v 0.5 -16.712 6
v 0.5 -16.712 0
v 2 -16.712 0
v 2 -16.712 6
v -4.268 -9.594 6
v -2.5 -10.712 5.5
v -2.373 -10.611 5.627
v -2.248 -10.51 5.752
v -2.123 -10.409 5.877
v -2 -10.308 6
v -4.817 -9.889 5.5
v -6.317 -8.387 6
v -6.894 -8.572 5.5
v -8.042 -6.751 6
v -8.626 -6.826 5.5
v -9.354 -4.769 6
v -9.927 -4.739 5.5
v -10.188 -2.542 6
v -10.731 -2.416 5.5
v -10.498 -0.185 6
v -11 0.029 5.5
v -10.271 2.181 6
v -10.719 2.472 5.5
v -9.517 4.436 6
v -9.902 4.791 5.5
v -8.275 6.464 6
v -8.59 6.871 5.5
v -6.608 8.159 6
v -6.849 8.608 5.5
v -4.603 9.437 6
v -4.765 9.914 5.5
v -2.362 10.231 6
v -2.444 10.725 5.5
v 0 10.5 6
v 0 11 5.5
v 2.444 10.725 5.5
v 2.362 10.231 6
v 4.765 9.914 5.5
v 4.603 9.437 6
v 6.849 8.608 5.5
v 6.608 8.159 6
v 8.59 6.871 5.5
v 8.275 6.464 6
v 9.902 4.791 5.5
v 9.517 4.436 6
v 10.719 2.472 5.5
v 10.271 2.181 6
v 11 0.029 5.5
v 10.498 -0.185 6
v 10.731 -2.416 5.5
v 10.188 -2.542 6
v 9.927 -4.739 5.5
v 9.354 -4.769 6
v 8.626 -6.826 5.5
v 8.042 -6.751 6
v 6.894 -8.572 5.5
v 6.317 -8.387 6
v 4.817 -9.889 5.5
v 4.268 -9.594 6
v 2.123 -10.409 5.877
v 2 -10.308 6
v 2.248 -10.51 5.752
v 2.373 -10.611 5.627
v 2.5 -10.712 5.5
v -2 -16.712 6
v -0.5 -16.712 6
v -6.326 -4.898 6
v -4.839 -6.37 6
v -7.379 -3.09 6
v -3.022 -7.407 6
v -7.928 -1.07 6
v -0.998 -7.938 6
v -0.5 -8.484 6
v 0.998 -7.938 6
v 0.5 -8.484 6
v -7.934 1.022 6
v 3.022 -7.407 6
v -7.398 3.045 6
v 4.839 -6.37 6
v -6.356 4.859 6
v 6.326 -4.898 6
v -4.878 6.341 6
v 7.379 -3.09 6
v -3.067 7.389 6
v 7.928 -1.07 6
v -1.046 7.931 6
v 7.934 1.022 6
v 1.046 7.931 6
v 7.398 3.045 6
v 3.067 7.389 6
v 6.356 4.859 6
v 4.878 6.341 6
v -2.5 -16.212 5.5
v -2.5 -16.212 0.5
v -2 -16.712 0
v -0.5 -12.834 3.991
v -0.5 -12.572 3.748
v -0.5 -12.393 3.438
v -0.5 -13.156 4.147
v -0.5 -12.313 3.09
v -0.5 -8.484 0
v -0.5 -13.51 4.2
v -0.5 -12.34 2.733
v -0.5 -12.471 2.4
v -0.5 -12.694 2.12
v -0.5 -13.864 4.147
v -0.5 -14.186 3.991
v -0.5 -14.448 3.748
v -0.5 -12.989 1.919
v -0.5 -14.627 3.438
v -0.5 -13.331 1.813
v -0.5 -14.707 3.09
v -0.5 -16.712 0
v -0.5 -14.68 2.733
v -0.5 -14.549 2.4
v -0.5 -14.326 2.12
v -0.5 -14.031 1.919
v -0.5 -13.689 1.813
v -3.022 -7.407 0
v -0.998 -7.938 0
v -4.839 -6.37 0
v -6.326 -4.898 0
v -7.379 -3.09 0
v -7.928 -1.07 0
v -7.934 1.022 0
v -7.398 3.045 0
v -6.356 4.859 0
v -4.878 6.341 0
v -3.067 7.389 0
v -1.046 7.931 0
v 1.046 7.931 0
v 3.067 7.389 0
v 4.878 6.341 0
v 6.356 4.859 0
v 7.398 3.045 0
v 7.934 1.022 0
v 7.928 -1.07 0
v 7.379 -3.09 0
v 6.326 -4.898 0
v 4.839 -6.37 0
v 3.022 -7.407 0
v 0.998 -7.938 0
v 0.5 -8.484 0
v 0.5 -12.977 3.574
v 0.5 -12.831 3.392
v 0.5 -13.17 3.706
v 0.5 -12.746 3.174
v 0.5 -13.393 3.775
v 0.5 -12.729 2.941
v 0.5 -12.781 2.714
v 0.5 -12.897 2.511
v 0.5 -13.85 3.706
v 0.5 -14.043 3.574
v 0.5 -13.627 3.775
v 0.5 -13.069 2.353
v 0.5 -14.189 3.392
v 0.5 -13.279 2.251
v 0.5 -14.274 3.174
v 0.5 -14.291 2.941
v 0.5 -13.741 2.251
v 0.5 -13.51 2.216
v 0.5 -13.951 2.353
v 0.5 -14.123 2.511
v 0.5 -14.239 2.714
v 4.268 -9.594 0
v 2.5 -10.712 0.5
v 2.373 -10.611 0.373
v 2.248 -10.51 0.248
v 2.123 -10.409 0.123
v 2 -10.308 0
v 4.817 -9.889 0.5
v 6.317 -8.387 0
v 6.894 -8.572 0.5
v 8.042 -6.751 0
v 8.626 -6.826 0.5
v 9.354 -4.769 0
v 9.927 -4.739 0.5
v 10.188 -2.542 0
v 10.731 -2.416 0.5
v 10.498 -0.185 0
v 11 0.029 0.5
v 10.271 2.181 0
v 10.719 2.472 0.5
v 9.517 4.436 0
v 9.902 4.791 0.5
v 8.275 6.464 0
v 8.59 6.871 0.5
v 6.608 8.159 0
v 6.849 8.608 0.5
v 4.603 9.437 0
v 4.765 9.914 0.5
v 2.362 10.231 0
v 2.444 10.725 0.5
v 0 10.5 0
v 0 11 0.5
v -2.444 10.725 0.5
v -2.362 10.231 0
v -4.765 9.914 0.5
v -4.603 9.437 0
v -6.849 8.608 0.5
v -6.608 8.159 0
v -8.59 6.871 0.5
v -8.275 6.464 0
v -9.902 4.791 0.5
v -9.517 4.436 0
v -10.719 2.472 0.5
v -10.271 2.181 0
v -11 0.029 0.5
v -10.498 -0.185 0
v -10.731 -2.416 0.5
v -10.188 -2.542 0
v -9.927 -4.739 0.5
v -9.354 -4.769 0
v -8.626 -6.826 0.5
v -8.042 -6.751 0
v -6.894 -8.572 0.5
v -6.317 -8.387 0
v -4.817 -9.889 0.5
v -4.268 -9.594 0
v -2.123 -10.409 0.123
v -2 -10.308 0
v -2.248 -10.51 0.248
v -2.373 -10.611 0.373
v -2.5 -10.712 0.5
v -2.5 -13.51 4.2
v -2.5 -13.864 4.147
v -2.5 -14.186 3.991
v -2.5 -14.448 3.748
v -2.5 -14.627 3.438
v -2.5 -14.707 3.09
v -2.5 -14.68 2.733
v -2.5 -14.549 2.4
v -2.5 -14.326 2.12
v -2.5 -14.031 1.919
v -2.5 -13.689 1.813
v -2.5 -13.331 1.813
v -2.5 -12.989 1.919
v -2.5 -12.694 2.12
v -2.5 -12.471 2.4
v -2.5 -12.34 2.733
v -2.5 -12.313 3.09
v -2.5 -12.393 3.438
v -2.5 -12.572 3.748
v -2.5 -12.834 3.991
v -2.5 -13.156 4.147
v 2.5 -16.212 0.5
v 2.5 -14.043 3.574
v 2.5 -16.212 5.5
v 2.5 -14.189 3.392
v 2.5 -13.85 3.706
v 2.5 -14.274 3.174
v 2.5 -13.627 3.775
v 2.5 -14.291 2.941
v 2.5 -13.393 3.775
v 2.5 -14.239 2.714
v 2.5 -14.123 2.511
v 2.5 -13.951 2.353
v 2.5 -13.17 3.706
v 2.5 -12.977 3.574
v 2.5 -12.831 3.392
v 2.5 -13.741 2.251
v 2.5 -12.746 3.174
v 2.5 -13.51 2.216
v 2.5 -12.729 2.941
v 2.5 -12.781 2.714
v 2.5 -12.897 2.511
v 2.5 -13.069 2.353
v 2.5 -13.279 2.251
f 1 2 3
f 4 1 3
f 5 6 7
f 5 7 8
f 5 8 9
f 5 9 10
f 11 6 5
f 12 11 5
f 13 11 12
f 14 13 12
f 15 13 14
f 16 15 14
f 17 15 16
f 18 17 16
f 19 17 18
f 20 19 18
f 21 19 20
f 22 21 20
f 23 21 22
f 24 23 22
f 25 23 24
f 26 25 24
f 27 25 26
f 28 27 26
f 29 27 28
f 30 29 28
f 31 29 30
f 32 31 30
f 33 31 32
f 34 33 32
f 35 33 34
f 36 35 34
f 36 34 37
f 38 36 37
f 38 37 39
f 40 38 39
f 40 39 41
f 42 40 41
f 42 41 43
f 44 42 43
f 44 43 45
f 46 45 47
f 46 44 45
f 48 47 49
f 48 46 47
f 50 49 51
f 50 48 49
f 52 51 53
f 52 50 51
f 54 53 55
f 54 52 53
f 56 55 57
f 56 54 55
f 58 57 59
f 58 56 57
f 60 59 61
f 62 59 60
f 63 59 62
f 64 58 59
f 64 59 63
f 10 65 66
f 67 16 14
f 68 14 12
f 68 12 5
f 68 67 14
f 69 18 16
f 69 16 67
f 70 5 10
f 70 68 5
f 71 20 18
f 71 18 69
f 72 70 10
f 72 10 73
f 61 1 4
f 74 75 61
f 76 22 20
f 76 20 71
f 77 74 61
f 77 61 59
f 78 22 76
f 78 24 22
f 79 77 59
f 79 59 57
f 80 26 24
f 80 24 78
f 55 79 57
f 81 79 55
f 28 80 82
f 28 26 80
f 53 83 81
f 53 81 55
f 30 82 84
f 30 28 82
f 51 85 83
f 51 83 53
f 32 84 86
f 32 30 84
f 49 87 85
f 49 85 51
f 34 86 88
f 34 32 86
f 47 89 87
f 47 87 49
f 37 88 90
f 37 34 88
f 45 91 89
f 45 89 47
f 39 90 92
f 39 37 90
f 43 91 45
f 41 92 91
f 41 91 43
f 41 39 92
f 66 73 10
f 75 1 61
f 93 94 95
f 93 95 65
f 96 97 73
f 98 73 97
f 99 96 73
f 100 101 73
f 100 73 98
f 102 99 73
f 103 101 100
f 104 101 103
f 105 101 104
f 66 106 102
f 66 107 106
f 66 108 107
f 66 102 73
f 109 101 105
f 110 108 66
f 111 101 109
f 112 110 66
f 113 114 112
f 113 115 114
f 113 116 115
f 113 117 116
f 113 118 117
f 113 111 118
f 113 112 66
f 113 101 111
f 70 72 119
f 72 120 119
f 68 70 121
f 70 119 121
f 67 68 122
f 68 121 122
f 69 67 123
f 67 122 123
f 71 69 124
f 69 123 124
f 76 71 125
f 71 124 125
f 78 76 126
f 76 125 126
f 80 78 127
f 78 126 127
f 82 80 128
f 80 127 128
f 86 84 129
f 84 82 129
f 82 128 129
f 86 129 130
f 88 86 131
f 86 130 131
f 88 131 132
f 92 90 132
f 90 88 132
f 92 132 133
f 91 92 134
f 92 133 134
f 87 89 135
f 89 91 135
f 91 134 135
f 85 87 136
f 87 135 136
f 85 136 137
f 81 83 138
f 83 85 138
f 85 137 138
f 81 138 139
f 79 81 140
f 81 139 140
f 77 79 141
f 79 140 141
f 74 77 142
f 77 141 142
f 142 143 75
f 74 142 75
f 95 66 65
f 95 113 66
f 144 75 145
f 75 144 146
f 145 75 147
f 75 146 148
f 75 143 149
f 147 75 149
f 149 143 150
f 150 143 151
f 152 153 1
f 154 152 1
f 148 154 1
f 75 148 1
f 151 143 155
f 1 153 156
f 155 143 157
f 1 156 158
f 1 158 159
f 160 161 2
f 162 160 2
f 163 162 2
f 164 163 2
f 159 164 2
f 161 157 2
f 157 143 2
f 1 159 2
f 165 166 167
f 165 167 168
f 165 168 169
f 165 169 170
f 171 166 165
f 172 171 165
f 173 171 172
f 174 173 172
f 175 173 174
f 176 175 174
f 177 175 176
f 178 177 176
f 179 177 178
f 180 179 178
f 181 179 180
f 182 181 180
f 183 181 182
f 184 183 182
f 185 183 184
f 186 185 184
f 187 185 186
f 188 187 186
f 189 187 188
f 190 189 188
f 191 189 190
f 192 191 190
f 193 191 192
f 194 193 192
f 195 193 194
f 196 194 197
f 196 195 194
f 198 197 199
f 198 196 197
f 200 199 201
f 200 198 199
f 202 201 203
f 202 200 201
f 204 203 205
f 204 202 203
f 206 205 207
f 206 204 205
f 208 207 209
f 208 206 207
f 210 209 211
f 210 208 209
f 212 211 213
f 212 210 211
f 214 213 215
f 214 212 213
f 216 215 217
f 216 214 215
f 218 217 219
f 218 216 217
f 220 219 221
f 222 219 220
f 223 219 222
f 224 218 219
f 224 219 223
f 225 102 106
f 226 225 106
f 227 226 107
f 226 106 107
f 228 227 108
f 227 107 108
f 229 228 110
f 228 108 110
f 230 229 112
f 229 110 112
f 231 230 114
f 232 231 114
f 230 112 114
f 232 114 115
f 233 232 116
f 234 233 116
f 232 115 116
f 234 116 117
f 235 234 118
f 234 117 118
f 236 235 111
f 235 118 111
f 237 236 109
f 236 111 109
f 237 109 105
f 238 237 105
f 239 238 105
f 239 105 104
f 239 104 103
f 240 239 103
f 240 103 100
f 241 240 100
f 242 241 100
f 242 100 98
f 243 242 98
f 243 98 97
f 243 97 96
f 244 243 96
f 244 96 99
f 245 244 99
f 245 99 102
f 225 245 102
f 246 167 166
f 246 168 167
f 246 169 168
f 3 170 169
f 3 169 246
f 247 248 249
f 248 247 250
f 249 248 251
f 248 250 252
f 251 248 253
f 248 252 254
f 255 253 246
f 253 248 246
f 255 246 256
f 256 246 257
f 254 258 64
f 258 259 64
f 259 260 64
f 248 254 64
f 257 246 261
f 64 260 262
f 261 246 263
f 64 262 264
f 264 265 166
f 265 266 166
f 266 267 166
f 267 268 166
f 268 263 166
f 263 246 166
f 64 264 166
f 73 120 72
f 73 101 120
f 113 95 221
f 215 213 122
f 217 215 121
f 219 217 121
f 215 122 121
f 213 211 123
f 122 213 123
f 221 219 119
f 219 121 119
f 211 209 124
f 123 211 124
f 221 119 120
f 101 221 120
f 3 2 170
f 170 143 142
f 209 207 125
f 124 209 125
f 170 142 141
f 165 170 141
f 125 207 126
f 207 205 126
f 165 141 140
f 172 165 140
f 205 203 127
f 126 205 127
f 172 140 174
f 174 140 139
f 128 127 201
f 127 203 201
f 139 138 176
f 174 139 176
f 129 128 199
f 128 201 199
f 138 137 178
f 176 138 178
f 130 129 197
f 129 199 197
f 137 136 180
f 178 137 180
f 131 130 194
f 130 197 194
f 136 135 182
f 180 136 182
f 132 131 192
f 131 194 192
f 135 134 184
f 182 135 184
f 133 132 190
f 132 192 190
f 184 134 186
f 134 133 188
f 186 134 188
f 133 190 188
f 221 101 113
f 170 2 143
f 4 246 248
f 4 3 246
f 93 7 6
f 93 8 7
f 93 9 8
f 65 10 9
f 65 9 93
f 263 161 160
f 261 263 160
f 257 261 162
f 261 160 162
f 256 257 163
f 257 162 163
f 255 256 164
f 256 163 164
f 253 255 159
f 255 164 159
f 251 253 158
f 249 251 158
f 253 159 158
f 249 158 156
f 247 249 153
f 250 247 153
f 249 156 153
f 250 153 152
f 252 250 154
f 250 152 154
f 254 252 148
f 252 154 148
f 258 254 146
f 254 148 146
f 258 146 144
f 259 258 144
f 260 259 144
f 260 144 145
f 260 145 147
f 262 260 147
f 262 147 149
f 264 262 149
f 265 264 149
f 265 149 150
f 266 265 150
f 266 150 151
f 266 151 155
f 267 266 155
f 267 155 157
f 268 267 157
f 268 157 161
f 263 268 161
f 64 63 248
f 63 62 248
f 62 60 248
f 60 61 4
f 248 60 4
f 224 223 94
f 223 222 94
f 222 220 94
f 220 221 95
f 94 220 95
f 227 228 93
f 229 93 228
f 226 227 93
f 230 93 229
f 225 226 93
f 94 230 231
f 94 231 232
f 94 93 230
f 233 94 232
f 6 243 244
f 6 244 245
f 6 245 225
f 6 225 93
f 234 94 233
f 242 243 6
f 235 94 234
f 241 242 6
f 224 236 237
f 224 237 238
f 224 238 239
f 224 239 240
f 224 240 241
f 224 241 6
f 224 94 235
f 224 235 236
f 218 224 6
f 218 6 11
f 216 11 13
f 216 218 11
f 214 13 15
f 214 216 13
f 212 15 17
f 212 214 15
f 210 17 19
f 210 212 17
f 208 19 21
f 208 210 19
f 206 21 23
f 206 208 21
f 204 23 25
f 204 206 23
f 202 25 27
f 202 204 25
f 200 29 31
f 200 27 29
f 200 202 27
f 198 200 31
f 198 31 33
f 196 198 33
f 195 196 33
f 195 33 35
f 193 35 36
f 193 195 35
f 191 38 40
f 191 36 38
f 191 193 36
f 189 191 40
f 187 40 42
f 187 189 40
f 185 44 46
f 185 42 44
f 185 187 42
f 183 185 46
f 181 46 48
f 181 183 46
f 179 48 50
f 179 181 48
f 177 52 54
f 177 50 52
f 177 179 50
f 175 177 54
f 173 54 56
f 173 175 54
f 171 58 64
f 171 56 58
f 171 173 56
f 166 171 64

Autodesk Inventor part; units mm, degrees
ref_plane "YZ Plane" through (0, 0, 0) normal (1, 0, 0) x (0, 1, 0)
ref_plane "XZ Plane" through (0, 0, 0) normal (0, 1, 0) x (-1, 0, 0)
ref_plane "XY Plane" through (0, 0, 0) normal (0, 0, 1) x (1, 0, 0)
sketch "Esquisse1" plane through (0, 0, 0) normal (0, 0, 1) x (1, 0, 0)
  arc A0 (0.5, -7.9844) -> (-0.5, -7.9844) centre (0, 0) ccw
  arc A1 (2.5, -10.7121) -> (-2.5, -10.7121) centre (0, 0) ccw
  line L0 (-0.5, -7.9844) -> (-0.5, -16.7121)
  line L1 (0.5, -7.9844) -> (0.5, -16.7121)
  line L2 (-0.5, -7.9844) -> (0.5, -7.9844) construction
  line L3 (-0.5, -16.7121) -> (-2.5, -16.7121)
  line L4 (-2.5, -16.7121) -> (-2.5, -10.7121)
  line L5 (0.5, -16.7121) -> (2.5, -16.7121)
  line L6 (2.5, -16.7121) -> (2.5, -10.7121)
  point P0 (0, -7.9844)
  dimension "d0" = 8
  dimension "d1" = 1
  dimension "d2" = 3
  dimension "d3" = 6
  dimension "d4" = 2
extrude "Extrusion1" add sketch "Esquisse1" along normal blind 6
chamfer "Chanfrein1" distance 0.5 angle 45 10 edges at (0, 11, 6) (0, 11, 0) (-2.5, -16.7121, 3) (2.5, -16.7121, 3) (2.5, -13.7121, 6) (2.5, -13.7121, 0) (-2.5, -13.7121, 6) (-2.5, -13.7121, 0) (-0.5, -7.9844, 3) (0.5, -7.9844, 3)
sketch "Esquisse2" plane through (-2.5, -16.2121, 0.5) normal (-1, 0, 0) x (0, 0, 1)
  line L0 (-0.5, -0.5) -> (5.5, -0.5) projected
  line L1 (5.5, -0.5) -> (5.5, 5.9044) projected
  point P0 (-0.5, 16.2121)
  point P1 (2.5, 2.7022)
  point P2 (2.5, -0.5)
  point P3 (5.5, 2.7022)
hole "Perçage1" at (-2.5, -13.51, 3) direction (1, 0, 0) diameter 2.4 depth 2 clearance for "Vis d'assemblage à six pans creux ISO 4762" size "M2" standard "ISO"
sketch "Esquisse3" plane through (2.5, -16.2121, 0.5) normal (1, 0, 0) x (0, 0, -1)
  line L0 (0.5, -0.5) -> (0.5, 5.9044) projected
  line L1 (-5.5, -0.5) -> (0.5, -0.5) projected
  point P0 (0.5, 16.2121)
  point P1 (-2.5, 2.7022)
  point P2 (0.5, 2.7022)
  point P3 (-2.5, -0.5)
hole "Perçage2" at (2.5, -13.51, 3) direction (-1, 0, 0) diameter 1.567 depth 2 thread size "M2x0.4" class "6H" standard "ISO Metric profile"
properties part number "blocage_ressort_canon" material "Aluminium 6061"
